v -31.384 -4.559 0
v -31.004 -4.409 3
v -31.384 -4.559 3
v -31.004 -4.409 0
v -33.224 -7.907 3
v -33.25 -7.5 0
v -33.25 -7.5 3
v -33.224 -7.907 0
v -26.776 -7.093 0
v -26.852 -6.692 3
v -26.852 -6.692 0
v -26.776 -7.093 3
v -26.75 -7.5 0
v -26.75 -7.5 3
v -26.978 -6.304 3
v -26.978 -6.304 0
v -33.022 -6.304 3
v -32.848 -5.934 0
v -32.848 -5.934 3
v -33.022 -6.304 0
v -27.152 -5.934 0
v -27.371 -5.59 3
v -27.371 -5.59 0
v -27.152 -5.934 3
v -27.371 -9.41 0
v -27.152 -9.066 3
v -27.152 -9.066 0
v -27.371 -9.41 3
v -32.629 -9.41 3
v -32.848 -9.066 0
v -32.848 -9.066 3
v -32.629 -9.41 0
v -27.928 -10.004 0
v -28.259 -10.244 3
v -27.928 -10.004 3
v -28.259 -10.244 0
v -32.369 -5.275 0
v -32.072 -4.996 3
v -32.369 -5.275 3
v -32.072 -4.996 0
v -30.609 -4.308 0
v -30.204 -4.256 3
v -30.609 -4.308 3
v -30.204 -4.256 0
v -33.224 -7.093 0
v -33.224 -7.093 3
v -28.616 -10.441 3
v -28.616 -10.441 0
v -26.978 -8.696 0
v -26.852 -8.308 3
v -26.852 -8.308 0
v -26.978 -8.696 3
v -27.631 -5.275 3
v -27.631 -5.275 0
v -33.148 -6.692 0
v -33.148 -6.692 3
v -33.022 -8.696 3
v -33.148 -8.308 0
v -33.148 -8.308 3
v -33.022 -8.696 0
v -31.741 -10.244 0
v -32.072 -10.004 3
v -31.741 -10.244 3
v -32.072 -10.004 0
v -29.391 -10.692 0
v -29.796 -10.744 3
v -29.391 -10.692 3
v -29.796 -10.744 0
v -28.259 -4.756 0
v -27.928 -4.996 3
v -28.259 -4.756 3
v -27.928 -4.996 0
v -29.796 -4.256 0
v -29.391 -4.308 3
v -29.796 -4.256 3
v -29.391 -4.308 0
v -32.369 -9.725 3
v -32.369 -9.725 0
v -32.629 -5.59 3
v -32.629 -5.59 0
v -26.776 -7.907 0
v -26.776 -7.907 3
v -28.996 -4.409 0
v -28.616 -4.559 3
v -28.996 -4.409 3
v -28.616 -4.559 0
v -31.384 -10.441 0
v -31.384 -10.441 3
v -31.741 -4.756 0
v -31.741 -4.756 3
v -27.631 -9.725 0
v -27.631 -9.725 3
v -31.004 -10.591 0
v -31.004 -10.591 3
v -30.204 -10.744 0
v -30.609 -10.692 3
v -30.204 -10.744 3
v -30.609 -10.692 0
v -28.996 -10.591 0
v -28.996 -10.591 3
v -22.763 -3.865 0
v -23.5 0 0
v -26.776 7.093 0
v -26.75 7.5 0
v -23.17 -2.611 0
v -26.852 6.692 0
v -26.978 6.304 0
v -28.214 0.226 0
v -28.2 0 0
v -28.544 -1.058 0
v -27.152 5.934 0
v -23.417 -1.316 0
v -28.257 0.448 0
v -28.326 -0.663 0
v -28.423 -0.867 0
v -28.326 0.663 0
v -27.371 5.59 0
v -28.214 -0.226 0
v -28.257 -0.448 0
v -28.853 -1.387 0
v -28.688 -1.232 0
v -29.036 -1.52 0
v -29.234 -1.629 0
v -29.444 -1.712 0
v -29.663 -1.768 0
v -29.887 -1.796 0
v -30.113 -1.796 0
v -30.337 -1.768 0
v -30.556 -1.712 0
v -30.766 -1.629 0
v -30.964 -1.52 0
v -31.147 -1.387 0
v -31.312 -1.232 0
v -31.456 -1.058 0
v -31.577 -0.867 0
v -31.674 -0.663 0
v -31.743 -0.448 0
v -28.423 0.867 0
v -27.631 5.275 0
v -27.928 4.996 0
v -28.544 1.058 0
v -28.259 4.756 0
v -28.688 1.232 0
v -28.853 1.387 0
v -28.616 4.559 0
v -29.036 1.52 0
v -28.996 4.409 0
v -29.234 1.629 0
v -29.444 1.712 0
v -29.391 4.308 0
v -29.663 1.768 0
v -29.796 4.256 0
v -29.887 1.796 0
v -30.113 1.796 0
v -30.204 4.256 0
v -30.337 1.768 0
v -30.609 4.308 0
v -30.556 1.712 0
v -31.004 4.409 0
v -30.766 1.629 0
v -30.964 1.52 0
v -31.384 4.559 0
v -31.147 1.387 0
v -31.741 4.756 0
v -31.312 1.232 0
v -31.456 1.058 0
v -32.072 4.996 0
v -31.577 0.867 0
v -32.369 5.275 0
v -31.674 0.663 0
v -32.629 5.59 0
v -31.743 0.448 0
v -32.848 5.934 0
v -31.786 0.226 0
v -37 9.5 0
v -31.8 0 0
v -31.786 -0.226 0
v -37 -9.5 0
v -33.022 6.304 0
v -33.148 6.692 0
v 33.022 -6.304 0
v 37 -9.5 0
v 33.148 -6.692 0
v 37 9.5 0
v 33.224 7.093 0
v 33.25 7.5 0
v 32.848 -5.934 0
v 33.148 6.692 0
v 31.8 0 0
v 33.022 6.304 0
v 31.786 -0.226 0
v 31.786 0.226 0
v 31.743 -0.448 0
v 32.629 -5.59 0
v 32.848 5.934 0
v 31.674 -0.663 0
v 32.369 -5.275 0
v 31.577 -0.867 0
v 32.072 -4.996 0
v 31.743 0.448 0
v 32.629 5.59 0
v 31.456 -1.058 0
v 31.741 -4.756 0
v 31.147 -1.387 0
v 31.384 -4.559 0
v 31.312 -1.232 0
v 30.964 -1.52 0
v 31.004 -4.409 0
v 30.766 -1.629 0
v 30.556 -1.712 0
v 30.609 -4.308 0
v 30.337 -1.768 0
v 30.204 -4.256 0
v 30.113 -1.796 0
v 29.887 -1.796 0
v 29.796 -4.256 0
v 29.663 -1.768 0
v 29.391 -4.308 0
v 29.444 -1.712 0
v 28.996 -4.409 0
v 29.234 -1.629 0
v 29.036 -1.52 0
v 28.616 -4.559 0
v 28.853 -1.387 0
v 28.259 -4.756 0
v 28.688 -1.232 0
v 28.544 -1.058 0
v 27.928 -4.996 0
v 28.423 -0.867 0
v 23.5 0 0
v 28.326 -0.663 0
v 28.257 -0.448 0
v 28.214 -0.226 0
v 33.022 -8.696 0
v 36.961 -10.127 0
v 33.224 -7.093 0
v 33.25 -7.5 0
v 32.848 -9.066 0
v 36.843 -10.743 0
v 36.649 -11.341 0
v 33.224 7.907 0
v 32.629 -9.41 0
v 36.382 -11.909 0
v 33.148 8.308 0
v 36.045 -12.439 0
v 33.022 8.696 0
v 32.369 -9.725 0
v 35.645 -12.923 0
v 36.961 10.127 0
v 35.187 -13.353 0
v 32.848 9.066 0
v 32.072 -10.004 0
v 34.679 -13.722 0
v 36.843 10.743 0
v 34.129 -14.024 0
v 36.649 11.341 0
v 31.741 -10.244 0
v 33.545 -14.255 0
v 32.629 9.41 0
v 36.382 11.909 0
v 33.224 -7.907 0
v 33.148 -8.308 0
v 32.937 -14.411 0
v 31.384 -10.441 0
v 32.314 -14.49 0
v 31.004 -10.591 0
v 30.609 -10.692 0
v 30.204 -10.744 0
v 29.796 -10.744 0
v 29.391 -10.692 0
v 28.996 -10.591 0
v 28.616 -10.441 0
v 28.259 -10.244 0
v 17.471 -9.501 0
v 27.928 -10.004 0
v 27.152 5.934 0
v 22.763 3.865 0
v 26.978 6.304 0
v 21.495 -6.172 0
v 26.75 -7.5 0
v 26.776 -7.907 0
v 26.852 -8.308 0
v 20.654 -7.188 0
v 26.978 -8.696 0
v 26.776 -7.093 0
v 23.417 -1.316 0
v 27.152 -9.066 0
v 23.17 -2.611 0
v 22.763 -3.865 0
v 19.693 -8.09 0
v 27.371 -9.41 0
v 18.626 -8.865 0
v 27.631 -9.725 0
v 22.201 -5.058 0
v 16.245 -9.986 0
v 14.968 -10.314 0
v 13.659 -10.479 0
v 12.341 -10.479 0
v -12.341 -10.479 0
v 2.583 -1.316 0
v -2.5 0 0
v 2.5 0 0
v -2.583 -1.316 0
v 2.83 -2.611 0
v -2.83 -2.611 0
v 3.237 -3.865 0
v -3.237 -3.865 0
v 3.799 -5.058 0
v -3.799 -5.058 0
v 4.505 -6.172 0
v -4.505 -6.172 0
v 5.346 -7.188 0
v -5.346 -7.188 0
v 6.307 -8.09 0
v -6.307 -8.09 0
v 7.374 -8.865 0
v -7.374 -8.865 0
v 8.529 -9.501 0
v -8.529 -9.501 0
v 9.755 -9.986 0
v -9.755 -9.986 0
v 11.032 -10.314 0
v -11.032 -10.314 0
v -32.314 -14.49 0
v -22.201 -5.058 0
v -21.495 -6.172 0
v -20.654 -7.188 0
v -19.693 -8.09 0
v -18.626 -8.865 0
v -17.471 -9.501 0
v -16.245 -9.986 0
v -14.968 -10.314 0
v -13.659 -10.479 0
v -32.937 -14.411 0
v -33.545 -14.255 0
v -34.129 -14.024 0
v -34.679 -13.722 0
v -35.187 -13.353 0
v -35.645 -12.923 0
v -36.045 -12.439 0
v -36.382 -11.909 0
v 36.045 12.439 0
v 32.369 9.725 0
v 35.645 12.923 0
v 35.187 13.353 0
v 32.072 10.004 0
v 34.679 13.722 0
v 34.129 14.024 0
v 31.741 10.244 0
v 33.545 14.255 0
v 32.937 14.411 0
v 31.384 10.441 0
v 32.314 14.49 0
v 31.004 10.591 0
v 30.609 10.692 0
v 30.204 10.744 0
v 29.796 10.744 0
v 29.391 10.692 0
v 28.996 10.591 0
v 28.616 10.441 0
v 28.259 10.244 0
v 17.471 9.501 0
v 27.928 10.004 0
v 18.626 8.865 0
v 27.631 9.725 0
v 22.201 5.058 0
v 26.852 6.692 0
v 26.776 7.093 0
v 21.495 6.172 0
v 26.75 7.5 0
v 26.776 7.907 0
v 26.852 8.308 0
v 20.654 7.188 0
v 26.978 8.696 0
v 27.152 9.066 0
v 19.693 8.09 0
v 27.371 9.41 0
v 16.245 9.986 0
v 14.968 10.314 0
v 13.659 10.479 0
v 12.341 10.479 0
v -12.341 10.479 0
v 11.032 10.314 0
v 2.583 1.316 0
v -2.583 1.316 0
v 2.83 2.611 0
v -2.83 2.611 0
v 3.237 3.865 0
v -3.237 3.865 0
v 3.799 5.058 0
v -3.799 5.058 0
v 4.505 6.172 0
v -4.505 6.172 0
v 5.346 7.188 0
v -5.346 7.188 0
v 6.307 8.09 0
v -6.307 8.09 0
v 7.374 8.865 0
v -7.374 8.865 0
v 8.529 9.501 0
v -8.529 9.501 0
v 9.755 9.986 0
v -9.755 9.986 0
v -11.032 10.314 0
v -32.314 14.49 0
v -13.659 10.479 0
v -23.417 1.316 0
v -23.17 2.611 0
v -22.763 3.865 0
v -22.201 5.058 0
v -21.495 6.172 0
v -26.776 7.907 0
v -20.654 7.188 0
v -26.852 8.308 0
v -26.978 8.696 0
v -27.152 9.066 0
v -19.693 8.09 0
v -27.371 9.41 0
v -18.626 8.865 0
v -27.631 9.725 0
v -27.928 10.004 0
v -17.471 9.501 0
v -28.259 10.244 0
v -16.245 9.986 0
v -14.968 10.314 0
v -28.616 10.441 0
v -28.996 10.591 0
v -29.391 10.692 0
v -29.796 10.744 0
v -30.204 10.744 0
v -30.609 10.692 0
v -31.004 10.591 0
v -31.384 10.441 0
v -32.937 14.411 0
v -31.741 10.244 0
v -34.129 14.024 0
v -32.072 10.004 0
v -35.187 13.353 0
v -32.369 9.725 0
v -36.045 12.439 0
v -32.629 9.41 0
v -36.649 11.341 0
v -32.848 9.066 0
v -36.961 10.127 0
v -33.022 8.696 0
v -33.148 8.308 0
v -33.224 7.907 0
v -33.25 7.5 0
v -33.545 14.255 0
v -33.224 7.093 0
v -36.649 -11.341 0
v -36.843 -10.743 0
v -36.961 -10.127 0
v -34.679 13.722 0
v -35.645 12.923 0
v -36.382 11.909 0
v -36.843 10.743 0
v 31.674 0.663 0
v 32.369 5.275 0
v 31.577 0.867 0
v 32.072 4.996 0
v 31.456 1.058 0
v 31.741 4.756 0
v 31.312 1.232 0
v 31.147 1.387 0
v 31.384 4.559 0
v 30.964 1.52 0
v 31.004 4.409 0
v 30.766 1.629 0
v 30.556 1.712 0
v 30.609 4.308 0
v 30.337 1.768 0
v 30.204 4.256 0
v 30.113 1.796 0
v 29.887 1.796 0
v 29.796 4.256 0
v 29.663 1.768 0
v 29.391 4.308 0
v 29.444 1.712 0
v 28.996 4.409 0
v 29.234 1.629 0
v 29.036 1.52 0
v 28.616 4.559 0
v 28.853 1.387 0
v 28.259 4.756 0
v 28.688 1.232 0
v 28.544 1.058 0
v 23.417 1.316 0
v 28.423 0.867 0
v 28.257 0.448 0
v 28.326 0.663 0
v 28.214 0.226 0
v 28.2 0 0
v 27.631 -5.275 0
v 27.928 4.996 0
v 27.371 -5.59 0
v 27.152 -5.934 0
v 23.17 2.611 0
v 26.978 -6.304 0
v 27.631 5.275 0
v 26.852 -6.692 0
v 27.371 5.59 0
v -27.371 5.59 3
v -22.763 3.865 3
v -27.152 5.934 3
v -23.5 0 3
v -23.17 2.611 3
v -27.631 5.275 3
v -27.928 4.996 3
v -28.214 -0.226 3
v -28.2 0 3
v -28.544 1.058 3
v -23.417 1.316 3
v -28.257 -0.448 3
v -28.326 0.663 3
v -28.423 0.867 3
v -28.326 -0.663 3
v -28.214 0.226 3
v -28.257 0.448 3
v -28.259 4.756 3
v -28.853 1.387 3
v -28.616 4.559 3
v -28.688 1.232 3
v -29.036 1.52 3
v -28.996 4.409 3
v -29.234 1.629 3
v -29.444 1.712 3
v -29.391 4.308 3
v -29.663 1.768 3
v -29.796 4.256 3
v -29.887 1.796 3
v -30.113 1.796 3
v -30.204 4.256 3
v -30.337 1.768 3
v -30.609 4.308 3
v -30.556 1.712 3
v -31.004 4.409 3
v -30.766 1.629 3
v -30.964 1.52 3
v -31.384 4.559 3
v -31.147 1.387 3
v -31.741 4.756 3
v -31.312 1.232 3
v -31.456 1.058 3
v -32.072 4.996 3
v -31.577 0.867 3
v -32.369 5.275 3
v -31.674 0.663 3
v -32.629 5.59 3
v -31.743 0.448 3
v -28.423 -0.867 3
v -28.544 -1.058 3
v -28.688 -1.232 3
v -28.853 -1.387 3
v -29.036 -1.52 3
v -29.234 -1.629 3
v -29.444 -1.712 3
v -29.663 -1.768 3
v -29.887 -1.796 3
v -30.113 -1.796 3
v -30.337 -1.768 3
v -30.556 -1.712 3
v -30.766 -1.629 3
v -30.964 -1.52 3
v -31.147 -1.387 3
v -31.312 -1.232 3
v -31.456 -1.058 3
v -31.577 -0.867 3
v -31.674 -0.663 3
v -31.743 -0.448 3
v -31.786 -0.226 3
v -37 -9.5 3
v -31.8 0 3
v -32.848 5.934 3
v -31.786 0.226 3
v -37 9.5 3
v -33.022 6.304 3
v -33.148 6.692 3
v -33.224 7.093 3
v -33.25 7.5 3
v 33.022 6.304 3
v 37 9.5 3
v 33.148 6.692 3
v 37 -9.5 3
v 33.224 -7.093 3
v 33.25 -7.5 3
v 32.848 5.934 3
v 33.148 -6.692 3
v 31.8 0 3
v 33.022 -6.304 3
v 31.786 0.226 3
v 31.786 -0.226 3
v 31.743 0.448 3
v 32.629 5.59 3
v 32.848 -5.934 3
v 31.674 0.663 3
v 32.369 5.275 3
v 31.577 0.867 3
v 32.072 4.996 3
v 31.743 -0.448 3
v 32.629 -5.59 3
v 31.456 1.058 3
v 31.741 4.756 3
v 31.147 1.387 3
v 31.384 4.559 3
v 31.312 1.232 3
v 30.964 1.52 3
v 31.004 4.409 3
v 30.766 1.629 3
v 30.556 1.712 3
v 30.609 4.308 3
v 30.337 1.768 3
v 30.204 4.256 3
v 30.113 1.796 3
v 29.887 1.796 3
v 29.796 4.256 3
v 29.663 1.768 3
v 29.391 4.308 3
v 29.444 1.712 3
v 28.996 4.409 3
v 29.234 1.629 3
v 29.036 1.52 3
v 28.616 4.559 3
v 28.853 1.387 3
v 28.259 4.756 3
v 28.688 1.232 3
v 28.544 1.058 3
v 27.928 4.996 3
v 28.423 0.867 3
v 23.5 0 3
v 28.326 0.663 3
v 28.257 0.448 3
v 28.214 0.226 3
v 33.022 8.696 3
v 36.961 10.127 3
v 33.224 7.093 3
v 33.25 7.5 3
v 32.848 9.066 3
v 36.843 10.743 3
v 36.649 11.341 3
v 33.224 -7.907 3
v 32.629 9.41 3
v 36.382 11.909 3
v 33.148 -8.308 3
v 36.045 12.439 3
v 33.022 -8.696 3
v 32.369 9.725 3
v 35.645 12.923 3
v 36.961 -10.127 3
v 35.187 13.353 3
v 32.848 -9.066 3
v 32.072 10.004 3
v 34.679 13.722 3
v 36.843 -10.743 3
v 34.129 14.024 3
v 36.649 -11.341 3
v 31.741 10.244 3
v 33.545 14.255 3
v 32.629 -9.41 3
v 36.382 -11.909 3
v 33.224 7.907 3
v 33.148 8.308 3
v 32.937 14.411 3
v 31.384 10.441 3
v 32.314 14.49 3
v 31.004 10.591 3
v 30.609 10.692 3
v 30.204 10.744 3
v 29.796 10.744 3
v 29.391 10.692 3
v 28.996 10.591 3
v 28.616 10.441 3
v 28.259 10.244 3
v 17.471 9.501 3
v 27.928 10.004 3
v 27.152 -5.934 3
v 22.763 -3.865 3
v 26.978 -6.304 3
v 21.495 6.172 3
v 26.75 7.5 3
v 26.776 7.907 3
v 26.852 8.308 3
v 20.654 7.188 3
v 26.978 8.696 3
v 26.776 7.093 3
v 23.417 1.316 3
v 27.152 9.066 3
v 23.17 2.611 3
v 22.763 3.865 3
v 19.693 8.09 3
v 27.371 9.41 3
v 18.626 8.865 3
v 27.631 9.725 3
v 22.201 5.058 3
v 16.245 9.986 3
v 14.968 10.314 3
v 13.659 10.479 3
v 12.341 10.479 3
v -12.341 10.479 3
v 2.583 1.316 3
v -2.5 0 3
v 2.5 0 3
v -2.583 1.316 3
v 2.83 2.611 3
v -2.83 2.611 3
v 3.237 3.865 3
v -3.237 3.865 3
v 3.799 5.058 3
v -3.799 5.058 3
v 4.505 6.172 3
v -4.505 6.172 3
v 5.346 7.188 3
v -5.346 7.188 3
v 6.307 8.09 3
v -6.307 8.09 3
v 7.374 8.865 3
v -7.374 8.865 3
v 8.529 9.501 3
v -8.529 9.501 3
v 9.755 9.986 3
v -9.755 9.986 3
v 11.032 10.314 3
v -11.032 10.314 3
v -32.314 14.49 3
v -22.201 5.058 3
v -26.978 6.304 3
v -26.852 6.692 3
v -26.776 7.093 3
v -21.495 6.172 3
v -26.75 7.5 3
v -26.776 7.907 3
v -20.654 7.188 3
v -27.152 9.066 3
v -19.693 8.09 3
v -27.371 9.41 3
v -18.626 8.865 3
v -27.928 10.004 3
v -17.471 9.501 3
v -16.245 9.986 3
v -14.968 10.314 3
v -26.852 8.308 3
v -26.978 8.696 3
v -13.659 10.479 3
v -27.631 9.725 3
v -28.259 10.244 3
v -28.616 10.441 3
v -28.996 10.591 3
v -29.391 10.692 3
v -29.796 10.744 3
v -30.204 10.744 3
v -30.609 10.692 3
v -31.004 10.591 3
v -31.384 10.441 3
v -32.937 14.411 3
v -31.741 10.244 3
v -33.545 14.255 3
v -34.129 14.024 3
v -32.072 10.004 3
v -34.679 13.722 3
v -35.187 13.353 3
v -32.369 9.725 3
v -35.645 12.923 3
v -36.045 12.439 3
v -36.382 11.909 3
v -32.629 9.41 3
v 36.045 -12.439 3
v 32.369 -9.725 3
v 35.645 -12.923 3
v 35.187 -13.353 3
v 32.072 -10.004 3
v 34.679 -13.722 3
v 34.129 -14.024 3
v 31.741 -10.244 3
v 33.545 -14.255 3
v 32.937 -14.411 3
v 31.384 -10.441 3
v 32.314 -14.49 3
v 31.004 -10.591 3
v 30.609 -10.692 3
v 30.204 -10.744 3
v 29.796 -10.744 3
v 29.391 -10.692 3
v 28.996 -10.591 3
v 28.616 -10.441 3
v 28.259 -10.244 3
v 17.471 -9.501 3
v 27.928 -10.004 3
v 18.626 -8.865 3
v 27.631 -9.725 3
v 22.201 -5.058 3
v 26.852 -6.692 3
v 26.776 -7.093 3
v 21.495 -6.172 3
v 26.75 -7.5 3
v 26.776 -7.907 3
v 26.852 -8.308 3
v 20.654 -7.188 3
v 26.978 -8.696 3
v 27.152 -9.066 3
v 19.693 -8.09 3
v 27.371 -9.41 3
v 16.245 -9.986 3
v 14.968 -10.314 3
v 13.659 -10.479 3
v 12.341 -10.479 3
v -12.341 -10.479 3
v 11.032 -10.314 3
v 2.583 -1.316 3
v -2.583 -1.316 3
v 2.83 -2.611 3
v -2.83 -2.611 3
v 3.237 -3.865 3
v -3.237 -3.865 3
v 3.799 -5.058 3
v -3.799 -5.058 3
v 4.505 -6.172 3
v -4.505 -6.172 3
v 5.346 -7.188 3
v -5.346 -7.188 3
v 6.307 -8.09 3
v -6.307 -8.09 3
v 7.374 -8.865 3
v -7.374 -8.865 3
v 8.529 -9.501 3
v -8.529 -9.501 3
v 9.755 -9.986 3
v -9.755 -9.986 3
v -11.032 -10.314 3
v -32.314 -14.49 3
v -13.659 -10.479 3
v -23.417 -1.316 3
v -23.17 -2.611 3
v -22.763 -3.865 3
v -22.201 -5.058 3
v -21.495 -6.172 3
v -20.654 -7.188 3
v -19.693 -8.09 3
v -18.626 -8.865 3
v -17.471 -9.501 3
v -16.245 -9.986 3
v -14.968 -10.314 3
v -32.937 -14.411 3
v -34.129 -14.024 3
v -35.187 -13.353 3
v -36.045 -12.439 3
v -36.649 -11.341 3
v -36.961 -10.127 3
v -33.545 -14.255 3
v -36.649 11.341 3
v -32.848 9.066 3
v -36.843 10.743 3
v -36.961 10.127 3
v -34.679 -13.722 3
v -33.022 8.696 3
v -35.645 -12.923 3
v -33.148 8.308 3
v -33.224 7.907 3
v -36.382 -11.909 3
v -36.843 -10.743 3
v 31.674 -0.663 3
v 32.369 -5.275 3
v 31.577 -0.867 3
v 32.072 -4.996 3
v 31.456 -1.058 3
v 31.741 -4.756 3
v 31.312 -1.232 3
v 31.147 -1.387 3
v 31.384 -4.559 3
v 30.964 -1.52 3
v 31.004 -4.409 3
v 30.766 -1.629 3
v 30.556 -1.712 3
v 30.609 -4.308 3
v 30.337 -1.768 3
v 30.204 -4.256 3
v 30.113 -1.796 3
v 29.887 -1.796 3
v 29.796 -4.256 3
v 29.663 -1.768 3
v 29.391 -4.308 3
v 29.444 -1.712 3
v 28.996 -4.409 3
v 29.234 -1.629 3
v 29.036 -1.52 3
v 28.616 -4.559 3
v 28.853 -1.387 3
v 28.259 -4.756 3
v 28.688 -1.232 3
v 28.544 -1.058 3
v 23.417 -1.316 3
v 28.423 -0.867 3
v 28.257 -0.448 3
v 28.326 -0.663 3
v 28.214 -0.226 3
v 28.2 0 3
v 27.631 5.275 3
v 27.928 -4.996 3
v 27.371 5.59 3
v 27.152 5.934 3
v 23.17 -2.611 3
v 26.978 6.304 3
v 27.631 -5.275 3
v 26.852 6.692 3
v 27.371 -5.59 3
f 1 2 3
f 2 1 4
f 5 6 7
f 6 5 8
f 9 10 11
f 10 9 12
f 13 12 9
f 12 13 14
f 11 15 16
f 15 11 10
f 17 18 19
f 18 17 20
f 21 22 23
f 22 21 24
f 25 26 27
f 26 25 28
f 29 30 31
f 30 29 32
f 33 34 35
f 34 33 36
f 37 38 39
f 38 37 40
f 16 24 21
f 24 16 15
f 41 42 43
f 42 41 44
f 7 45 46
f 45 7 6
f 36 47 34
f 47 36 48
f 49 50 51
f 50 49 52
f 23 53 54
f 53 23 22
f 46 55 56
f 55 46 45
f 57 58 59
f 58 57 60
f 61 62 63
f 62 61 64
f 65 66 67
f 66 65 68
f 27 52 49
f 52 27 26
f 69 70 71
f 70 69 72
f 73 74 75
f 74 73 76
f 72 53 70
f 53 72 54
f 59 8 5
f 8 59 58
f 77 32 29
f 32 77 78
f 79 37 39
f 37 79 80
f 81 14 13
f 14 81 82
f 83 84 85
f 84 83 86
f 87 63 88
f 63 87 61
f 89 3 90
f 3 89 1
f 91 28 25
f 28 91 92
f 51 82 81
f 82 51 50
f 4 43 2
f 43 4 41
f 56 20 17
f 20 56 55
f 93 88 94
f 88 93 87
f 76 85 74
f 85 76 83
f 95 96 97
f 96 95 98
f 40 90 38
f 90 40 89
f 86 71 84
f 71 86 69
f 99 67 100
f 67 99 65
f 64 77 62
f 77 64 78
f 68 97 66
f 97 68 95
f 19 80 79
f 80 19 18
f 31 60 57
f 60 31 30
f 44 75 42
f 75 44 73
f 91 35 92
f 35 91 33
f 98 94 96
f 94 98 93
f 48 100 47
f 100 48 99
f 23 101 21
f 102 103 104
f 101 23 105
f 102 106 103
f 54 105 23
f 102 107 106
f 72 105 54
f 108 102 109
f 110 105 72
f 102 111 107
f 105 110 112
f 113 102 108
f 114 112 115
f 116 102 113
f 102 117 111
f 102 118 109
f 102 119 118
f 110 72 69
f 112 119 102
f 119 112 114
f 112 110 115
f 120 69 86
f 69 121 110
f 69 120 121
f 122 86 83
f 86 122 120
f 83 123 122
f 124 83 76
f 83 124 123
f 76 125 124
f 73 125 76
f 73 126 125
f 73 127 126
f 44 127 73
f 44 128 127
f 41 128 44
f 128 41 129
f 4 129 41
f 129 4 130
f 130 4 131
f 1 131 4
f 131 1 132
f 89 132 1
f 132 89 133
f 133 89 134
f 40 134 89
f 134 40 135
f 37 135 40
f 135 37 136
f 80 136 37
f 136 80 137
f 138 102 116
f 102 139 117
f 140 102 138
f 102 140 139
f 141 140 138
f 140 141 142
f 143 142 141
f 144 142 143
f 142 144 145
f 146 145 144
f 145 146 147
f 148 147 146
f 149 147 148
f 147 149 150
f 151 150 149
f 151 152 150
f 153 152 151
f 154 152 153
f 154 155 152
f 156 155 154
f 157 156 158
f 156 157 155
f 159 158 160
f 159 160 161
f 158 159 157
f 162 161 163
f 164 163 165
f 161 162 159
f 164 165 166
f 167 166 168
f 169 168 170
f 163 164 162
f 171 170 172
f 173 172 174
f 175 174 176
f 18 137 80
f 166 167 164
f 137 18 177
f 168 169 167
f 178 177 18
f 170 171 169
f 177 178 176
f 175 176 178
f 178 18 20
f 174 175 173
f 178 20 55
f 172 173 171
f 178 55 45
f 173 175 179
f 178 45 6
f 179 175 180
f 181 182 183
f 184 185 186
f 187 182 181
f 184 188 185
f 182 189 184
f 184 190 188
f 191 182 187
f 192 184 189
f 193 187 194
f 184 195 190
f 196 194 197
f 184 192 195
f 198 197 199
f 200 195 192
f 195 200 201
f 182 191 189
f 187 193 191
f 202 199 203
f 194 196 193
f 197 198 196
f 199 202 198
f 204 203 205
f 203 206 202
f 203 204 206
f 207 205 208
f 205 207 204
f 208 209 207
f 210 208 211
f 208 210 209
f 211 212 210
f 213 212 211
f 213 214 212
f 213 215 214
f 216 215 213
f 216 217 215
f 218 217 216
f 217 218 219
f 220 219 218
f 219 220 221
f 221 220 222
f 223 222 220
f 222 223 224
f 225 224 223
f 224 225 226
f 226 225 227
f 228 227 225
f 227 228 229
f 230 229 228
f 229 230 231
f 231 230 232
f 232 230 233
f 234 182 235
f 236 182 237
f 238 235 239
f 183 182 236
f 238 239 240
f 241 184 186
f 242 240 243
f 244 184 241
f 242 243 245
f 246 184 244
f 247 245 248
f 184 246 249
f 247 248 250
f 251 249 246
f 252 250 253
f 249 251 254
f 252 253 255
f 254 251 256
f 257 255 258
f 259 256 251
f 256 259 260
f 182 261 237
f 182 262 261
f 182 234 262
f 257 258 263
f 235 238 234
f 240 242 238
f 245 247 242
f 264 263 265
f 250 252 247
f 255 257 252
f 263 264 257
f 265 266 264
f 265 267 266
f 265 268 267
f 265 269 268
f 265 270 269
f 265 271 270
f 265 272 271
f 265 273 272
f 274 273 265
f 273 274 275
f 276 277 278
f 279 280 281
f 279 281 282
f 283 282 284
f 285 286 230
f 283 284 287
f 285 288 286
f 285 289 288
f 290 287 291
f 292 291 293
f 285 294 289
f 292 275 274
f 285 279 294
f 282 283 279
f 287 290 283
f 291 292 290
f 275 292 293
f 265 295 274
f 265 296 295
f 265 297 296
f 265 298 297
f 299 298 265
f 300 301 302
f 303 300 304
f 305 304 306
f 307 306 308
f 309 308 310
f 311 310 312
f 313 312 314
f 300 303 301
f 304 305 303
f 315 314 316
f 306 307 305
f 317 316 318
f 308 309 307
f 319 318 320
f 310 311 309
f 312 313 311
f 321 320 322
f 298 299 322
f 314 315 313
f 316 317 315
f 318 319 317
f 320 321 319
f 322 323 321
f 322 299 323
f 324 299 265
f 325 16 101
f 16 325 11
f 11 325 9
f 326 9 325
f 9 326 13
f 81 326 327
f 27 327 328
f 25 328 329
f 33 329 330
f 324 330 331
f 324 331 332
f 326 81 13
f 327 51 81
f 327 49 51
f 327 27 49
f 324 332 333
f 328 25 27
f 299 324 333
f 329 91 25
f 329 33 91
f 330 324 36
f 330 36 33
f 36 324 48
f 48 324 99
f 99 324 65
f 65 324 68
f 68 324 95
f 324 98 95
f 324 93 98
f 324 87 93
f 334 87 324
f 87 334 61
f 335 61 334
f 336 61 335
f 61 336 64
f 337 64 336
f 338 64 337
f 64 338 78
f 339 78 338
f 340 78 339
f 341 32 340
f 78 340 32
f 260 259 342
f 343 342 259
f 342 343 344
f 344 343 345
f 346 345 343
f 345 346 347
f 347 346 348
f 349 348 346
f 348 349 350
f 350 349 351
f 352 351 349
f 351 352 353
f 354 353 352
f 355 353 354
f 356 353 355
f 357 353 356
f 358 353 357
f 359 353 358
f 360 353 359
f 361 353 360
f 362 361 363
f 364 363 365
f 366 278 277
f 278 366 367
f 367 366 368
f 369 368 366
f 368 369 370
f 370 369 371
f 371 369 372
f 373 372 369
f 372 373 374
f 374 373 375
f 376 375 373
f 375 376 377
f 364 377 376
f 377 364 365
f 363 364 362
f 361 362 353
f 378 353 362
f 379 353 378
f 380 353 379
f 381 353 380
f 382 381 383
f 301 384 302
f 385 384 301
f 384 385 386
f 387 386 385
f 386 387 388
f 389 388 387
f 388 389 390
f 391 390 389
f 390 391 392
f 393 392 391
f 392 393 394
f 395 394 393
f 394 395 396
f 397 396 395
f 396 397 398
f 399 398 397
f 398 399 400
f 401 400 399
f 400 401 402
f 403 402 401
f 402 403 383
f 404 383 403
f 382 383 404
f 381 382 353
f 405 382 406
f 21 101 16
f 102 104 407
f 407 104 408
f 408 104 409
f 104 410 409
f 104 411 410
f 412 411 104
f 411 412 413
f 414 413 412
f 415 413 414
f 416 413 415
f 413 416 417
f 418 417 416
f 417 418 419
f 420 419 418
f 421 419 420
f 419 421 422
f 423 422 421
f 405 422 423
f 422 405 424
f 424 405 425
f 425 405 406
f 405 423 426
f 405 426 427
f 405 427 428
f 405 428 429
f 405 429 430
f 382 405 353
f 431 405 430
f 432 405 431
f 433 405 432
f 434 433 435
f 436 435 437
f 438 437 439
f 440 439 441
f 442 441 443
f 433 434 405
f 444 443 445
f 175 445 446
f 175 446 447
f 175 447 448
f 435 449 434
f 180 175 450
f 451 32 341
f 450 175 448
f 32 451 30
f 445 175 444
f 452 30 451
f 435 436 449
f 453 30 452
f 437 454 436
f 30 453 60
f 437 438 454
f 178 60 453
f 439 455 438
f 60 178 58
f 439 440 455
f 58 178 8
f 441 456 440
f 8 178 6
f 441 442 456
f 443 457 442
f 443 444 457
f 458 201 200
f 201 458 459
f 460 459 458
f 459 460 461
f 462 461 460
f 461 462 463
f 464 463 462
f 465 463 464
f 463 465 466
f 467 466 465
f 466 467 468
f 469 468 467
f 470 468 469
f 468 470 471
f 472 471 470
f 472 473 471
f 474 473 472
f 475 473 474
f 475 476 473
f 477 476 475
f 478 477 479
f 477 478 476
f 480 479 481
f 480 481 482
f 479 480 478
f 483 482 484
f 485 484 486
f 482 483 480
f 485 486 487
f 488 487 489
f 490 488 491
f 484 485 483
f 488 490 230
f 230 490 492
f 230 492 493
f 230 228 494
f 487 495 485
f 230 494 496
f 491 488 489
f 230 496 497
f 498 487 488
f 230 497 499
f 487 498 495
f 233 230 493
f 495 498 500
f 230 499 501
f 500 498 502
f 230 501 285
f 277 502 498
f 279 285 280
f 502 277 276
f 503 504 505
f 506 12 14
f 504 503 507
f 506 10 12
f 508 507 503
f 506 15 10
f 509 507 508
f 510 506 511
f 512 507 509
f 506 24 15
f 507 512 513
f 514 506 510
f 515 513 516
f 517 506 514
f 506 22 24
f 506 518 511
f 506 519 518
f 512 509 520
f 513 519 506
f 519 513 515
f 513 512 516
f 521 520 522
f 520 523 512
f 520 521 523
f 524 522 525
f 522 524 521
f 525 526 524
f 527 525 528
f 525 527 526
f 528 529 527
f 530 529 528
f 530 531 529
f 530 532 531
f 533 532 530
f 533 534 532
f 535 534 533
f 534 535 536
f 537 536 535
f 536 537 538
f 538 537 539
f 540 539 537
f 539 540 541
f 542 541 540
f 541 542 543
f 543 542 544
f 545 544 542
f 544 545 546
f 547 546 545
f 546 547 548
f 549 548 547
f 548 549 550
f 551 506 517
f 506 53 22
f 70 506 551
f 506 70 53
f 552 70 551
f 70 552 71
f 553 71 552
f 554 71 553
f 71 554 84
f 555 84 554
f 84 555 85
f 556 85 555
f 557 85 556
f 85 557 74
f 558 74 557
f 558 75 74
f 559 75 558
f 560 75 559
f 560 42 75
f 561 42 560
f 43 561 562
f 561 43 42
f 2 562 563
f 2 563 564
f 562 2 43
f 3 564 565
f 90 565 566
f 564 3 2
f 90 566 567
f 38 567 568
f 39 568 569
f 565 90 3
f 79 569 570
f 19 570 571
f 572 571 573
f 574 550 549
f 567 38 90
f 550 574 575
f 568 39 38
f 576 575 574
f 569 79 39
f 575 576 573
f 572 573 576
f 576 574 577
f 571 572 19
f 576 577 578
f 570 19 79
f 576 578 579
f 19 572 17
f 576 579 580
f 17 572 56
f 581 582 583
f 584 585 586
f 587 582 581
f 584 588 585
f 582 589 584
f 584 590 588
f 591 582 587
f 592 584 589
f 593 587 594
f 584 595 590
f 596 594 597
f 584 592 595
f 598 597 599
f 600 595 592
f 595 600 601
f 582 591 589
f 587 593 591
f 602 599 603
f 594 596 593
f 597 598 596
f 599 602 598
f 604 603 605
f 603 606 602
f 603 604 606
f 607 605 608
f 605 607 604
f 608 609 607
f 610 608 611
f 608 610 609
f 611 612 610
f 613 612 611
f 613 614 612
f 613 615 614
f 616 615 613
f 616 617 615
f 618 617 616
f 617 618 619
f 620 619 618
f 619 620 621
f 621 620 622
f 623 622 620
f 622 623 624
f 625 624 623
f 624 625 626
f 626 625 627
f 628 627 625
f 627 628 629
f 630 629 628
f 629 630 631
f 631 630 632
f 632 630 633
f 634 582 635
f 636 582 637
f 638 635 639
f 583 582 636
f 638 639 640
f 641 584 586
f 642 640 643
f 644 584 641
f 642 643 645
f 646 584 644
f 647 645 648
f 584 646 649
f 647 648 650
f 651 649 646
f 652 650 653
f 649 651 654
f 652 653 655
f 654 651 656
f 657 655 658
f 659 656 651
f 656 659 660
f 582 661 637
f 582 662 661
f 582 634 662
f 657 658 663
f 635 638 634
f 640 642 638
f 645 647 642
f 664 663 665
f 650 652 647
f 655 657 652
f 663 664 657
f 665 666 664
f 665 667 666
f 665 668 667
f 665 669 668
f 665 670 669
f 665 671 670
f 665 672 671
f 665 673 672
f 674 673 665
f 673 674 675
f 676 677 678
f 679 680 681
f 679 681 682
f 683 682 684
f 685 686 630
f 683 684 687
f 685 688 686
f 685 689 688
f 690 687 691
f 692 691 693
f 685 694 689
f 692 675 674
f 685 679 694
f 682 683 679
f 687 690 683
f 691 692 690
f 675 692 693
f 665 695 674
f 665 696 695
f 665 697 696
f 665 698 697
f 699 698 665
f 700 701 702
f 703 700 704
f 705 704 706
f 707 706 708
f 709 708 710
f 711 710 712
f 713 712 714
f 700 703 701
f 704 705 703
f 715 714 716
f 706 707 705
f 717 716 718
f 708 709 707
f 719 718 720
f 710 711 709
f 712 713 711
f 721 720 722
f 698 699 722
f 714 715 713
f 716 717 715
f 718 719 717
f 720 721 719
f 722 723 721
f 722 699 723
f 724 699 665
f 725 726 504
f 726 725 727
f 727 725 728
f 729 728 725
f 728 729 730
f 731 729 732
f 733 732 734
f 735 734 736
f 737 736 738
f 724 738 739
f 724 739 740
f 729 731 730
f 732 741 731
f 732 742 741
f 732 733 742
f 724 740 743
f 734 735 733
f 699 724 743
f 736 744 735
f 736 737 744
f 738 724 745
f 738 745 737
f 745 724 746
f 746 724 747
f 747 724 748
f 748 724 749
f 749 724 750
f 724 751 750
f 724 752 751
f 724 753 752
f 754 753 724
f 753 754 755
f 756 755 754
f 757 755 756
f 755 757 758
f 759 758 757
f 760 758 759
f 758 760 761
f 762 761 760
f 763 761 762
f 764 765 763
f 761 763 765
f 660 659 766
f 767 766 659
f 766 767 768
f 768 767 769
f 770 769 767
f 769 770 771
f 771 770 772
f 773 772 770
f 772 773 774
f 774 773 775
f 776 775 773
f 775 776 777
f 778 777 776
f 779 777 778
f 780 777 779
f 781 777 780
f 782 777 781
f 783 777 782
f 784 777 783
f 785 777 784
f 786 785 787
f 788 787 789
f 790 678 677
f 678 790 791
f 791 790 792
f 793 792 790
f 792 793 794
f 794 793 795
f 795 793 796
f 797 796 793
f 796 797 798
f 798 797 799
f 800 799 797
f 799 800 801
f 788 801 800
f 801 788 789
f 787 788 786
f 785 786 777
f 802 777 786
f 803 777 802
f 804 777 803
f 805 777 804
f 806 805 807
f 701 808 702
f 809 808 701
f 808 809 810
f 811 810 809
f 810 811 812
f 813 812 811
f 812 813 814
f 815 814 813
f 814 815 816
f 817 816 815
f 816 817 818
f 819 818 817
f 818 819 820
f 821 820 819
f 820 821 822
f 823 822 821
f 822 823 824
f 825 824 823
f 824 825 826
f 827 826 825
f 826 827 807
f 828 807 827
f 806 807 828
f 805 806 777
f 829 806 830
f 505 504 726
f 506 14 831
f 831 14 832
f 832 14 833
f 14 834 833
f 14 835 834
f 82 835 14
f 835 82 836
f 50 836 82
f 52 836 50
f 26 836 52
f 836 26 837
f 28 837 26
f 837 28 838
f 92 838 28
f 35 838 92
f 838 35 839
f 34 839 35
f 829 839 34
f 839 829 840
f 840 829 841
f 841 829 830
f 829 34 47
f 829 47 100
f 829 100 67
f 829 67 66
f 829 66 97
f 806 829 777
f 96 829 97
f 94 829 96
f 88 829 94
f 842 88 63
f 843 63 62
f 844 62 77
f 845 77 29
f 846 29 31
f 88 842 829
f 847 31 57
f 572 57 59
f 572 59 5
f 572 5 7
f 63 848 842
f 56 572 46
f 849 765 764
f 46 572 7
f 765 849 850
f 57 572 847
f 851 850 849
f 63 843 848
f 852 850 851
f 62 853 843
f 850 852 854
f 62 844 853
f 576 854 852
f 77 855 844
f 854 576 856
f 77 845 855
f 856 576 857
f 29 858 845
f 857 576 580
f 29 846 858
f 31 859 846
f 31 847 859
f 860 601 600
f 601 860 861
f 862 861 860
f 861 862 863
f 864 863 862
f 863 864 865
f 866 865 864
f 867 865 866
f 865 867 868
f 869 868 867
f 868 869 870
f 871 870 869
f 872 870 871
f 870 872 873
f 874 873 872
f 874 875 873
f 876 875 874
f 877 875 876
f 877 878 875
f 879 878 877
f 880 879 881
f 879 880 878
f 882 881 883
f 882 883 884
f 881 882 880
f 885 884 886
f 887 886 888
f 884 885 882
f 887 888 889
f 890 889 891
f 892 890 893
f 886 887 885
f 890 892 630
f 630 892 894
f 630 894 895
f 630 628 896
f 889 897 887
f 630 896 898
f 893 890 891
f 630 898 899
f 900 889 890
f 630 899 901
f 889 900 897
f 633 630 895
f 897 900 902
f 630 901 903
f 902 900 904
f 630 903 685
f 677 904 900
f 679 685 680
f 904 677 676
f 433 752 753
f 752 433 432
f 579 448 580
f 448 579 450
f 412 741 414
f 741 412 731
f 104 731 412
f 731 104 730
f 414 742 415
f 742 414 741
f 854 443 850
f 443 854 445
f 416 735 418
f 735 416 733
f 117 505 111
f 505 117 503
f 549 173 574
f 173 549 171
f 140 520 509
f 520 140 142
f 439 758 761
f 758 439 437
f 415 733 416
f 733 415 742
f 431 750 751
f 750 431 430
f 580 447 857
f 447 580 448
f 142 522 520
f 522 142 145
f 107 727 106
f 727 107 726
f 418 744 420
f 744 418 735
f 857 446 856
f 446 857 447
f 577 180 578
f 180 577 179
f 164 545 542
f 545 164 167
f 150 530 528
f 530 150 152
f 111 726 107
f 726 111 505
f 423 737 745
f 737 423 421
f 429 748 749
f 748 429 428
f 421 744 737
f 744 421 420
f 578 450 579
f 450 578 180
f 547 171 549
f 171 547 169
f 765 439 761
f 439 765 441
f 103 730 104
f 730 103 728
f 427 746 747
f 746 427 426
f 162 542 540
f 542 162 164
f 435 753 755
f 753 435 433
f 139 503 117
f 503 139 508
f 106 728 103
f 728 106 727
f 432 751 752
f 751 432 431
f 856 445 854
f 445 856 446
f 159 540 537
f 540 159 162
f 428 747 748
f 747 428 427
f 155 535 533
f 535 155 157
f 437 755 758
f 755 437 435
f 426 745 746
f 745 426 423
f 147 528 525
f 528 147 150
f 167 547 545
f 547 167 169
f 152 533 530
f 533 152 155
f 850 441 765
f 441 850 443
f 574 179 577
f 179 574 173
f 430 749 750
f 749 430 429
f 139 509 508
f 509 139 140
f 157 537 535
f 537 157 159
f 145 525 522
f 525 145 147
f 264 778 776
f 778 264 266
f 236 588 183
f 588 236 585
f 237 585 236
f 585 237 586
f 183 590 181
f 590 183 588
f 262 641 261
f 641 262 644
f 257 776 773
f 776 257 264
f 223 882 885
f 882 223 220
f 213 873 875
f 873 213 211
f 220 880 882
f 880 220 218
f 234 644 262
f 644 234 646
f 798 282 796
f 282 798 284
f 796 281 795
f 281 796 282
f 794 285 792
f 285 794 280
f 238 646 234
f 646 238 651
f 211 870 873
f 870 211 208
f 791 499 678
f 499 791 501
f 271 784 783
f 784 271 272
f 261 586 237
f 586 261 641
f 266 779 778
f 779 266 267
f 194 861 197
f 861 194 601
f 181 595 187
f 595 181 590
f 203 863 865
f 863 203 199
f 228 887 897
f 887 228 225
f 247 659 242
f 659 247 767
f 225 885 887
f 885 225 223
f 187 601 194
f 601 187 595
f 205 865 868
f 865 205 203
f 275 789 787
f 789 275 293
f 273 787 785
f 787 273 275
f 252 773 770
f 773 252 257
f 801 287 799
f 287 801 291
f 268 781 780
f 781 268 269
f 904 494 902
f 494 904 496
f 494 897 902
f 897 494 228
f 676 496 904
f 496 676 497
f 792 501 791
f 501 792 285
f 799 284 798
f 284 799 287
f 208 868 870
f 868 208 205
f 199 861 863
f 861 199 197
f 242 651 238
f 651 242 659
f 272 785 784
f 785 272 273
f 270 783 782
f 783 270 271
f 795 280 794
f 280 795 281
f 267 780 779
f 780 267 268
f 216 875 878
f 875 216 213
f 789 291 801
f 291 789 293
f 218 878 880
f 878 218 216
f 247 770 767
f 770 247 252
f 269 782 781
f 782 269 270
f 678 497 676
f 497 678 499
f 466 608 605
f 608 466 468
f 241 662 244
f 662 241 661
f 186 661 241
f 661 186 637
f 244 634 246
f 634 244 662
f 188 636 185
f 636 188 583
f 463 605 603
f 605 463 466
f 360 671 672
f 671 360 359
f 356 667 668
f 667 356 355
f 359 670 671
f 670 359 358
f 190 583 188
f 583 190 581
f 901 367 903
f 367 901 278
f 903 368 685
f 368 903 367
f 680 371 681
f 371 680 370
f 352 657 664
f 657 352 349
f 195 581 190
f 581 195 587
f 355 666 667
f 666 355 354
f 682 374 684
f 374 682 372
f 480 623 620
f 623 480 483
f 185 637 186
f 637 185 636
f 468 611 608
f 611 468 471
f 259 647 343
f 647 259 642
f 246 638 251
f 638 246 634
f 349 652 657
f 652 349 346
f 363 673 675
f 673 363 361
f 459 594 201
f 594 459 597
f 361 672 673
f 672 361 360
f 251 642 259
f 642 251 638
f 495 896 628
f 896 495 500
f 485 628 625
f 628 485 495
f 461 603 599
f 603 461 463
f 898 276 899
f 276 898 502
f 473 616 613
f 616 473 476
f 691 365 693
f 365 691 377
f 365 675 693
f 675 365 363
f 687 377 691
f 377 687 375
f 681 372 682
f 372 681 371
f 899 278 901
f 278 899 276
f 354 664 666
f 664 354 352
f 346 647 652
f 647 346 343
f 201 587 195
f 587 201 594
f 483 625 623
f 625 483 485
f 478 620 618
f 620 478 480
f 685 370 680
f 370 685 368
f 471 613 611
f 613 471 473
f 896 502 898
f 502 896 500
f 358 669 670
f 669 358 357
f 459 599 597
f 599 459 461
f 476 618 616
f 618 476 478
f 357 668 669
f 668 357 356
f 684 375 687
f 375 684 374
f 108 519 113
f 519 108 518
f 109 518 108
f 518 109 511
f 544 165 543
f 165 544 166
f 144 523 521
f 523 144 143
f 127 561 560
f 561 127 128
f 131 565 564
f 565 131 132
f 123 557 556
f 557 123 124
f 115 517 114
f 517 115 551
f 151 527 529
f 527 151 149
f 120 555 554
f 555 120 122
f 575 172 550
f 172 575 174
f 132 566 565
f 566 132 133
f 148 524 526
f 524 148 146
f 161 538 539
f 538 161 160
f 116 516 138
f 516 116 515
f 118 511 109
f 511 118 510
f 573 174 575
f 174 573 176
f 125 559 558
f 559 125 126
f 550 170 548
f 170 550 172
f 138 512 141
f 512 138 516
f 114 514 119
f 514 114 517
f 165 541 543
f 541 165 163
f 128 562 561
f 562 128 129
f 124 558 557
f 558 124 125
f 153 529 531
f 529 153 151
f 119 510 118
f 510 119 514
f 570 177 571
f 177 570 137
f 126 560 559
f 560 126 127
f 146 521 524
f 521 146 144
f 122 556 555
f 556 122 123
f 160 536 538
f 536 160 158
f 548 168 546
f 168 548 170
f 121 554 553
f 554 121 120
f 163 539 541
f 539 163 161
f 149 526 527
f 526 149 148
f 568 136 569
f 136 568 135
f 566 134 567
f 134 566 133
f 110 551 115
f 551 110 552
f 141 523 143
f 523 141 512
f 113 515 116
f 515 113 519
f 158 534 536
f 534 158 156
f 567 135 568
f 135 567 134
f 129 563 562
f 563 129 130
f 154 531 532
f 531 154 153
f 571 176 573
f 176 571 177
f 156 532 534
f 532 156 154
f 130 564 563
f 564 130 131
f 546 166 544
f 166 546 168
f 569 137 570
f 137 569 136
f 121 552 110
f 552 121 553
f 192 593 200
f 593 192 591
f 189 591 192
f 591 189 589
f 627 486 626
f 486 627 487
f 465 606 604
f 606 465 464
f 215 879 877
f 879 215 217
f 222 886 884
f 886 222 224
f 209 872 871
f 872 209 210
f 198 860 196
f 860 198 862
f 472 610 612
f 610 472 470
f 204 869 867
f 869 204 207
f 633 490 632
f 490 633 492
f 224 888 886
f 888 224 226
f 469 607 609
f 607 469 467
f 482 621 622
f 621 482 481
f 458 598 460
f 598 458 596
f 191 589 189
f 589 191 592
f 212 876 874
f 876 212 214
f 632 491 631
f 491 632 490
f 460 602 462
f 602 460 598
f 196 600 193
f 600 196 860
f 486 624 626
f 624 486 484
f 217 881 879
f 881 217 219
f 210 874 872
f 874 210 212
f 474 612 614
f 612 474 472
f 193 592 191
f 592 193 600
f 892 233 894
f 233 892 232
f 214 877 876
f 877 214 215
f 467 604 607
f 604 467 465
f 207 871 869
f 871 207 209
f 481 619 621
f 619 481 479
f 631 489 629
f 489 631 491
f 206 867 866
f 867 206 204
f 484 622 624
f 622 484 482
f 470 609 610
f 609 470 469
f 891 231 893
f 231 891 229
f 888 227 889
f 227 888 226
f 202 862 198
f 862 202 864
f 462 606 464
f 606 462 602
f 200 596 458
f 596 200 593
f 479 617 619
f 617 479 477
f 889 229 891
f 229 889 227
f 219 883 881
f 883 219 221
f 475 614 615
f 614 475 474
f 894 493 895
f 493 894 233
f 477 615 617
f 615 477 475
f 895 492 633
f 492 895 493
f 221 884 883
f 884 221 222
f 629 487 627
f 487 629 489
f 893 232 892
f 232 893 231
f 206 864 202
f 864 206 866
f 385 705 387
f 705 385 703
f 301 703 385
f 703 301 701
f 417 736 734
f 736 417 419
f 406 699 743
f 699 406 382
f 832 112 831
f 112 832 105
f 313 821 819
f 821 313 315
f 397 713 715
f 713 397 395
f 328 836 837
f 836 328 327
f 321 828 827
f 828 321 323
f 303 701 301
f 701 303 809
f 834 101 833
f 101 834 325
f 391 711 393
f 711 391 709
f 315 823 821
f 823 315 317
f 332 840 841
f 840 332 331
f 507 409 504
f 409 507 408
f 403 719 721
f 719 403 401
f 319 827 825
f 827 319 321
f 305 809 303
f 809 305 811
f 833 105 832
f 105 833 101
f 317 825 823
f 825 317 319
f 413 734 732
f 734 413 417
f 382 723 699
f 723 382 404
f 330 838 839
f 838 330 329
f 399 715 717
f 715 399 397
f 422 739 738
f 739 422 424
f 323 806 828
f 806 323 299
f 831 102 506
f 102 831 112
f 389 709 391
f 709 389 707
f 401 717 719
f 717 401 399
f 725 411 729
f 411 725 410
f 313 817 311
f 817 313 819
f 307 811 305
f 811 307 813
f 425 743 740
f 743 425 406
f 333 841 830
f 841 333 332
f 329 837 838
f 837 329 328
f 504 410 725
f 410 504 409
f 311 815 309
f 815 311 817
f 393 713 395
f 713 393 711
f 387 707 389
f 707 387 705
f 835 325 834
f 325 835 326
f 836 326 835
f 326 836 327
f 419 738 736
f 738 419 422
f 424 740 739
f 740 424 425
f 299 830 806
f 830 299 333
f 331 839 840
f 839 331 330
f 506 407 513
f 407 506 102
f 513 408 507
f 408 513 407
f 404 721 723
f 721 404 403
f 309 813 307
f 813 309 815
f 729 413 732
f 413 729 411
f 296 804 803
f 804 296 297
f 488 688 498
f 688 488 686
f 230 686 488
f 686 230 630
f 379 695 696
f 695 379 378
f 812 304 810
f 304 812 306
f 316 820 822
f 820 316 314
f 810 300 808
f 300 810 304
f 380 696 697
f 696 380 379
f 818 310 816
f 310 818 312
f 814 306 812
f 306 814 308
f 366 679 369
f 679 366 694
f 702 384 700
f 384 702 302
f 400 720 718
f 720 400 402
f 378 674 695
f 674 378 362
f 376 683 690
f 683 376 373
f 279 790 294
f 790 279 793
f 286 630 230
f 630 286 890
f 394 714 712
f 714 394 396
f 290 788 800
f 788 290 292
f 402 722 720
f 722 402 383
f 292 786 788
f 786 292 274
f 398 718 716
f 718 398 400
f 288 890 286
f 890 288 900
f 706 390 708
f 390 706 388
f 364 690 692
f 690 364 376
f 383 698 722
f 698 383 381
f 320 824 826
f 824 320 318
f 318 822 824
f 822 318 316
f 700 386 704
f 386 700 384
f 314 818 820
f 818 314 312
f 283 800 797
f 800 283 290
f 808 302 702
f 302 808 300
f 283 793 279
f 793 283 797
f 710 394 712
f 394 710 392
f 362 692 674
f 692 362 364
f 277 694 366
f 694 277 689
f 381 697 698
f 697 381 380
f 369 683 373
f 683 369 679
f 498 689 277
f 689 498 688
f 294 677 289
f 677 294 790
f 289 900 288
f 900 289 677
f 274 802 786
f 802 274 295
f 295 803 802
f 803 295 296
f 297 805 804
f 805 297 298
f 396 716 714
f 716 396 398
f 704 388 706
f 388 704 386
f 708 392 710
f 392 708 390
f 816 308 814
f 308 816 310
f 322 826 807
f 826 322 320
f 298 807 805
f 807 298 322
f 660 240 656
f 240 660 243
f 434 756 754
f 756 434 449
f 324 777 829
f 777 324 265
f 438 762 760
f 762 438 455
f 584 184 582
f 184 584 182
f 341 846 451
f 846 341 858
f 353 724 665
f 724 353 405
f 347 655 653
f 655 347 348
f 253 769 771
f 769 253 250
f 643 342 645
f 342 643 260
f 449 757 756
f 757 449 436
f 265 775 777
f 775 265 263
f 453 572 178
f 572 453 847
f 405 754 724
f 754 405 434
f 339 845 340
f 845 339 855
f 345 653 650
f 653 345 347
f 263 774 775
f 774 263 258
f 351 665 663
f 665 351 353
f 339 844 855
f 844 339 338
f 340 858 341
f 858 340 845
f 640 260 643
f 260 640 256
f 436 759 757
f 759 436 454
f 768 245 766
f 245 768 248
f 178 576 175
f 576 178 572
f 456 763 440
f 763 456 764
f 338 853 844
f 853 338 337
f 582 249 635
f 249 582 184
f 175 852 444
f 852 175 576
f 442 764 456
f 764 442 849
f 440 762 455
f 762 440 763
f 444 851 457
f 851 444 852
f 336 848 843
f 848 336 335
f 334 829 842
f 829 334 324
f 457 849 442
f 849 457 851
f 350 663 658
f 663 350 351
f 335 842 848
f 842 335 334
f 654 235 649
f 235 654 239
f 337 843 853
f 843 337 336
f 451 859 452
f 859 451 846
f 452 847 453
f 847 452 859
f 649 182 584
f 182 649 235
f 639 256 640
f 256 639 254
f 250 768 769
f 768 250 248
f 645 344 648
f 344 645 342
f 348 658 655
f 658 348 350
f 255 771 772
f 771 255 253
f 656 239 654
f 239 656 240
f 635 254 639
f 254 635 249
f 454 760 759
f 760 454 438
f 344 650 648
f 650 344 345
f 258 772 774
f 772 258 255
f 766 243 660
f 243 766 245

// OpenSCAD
$fn = 50;

difference() {
	union() {
		hull() {
			translate(v = [-32.0, 9.5, 0]) {
				cylinder(h = 3, r = 5);
			}
			translate(v = [32.0, 9.5, 0]) {
				cylinder(h = 3, r = 5);
			}
			translate(v = [-32.0, -9.5, 0]) {
				cylinder(h = 3, r = 5);
			}
			translate(v = [32.0, -9.5, 0]) {
				cylinder(h = 3, r = 5);
			}
		}
	}
	union() {
		translate(v = [-30.0, -7.5, 0]) {
			cylinder(h = 3, r = 3.25);
		}
		translate(v = [-30.0, 7.5, 0]) {
			cylinder(h = 3, r = 3.25);
		}
		translate(v = [30.0, -7.5, 0]) {
			cylinder(h = 3, r = 3.25);
		}
		translate(v = [30.0, 7.5, 0]) {
			cylinder(h = 3, r = 3.25);
		}
		translate(v = [-30.0, 0.0, 0]) {
			cylinder(h = 3, r = 1.8);
		}
		translate(v = [30.0, 0.0, 0]) {
			cylinder(h = 3, r = 1.8);
		}
		translate(v = [-13.0, 0, 0.0]) {
			cylinder(h = 3, r = 10.5);
		}
		translate(v = [13.0, 0, 0.0]) {
			cylinder(h = 3, r = 10.5);
		}
	}
}
